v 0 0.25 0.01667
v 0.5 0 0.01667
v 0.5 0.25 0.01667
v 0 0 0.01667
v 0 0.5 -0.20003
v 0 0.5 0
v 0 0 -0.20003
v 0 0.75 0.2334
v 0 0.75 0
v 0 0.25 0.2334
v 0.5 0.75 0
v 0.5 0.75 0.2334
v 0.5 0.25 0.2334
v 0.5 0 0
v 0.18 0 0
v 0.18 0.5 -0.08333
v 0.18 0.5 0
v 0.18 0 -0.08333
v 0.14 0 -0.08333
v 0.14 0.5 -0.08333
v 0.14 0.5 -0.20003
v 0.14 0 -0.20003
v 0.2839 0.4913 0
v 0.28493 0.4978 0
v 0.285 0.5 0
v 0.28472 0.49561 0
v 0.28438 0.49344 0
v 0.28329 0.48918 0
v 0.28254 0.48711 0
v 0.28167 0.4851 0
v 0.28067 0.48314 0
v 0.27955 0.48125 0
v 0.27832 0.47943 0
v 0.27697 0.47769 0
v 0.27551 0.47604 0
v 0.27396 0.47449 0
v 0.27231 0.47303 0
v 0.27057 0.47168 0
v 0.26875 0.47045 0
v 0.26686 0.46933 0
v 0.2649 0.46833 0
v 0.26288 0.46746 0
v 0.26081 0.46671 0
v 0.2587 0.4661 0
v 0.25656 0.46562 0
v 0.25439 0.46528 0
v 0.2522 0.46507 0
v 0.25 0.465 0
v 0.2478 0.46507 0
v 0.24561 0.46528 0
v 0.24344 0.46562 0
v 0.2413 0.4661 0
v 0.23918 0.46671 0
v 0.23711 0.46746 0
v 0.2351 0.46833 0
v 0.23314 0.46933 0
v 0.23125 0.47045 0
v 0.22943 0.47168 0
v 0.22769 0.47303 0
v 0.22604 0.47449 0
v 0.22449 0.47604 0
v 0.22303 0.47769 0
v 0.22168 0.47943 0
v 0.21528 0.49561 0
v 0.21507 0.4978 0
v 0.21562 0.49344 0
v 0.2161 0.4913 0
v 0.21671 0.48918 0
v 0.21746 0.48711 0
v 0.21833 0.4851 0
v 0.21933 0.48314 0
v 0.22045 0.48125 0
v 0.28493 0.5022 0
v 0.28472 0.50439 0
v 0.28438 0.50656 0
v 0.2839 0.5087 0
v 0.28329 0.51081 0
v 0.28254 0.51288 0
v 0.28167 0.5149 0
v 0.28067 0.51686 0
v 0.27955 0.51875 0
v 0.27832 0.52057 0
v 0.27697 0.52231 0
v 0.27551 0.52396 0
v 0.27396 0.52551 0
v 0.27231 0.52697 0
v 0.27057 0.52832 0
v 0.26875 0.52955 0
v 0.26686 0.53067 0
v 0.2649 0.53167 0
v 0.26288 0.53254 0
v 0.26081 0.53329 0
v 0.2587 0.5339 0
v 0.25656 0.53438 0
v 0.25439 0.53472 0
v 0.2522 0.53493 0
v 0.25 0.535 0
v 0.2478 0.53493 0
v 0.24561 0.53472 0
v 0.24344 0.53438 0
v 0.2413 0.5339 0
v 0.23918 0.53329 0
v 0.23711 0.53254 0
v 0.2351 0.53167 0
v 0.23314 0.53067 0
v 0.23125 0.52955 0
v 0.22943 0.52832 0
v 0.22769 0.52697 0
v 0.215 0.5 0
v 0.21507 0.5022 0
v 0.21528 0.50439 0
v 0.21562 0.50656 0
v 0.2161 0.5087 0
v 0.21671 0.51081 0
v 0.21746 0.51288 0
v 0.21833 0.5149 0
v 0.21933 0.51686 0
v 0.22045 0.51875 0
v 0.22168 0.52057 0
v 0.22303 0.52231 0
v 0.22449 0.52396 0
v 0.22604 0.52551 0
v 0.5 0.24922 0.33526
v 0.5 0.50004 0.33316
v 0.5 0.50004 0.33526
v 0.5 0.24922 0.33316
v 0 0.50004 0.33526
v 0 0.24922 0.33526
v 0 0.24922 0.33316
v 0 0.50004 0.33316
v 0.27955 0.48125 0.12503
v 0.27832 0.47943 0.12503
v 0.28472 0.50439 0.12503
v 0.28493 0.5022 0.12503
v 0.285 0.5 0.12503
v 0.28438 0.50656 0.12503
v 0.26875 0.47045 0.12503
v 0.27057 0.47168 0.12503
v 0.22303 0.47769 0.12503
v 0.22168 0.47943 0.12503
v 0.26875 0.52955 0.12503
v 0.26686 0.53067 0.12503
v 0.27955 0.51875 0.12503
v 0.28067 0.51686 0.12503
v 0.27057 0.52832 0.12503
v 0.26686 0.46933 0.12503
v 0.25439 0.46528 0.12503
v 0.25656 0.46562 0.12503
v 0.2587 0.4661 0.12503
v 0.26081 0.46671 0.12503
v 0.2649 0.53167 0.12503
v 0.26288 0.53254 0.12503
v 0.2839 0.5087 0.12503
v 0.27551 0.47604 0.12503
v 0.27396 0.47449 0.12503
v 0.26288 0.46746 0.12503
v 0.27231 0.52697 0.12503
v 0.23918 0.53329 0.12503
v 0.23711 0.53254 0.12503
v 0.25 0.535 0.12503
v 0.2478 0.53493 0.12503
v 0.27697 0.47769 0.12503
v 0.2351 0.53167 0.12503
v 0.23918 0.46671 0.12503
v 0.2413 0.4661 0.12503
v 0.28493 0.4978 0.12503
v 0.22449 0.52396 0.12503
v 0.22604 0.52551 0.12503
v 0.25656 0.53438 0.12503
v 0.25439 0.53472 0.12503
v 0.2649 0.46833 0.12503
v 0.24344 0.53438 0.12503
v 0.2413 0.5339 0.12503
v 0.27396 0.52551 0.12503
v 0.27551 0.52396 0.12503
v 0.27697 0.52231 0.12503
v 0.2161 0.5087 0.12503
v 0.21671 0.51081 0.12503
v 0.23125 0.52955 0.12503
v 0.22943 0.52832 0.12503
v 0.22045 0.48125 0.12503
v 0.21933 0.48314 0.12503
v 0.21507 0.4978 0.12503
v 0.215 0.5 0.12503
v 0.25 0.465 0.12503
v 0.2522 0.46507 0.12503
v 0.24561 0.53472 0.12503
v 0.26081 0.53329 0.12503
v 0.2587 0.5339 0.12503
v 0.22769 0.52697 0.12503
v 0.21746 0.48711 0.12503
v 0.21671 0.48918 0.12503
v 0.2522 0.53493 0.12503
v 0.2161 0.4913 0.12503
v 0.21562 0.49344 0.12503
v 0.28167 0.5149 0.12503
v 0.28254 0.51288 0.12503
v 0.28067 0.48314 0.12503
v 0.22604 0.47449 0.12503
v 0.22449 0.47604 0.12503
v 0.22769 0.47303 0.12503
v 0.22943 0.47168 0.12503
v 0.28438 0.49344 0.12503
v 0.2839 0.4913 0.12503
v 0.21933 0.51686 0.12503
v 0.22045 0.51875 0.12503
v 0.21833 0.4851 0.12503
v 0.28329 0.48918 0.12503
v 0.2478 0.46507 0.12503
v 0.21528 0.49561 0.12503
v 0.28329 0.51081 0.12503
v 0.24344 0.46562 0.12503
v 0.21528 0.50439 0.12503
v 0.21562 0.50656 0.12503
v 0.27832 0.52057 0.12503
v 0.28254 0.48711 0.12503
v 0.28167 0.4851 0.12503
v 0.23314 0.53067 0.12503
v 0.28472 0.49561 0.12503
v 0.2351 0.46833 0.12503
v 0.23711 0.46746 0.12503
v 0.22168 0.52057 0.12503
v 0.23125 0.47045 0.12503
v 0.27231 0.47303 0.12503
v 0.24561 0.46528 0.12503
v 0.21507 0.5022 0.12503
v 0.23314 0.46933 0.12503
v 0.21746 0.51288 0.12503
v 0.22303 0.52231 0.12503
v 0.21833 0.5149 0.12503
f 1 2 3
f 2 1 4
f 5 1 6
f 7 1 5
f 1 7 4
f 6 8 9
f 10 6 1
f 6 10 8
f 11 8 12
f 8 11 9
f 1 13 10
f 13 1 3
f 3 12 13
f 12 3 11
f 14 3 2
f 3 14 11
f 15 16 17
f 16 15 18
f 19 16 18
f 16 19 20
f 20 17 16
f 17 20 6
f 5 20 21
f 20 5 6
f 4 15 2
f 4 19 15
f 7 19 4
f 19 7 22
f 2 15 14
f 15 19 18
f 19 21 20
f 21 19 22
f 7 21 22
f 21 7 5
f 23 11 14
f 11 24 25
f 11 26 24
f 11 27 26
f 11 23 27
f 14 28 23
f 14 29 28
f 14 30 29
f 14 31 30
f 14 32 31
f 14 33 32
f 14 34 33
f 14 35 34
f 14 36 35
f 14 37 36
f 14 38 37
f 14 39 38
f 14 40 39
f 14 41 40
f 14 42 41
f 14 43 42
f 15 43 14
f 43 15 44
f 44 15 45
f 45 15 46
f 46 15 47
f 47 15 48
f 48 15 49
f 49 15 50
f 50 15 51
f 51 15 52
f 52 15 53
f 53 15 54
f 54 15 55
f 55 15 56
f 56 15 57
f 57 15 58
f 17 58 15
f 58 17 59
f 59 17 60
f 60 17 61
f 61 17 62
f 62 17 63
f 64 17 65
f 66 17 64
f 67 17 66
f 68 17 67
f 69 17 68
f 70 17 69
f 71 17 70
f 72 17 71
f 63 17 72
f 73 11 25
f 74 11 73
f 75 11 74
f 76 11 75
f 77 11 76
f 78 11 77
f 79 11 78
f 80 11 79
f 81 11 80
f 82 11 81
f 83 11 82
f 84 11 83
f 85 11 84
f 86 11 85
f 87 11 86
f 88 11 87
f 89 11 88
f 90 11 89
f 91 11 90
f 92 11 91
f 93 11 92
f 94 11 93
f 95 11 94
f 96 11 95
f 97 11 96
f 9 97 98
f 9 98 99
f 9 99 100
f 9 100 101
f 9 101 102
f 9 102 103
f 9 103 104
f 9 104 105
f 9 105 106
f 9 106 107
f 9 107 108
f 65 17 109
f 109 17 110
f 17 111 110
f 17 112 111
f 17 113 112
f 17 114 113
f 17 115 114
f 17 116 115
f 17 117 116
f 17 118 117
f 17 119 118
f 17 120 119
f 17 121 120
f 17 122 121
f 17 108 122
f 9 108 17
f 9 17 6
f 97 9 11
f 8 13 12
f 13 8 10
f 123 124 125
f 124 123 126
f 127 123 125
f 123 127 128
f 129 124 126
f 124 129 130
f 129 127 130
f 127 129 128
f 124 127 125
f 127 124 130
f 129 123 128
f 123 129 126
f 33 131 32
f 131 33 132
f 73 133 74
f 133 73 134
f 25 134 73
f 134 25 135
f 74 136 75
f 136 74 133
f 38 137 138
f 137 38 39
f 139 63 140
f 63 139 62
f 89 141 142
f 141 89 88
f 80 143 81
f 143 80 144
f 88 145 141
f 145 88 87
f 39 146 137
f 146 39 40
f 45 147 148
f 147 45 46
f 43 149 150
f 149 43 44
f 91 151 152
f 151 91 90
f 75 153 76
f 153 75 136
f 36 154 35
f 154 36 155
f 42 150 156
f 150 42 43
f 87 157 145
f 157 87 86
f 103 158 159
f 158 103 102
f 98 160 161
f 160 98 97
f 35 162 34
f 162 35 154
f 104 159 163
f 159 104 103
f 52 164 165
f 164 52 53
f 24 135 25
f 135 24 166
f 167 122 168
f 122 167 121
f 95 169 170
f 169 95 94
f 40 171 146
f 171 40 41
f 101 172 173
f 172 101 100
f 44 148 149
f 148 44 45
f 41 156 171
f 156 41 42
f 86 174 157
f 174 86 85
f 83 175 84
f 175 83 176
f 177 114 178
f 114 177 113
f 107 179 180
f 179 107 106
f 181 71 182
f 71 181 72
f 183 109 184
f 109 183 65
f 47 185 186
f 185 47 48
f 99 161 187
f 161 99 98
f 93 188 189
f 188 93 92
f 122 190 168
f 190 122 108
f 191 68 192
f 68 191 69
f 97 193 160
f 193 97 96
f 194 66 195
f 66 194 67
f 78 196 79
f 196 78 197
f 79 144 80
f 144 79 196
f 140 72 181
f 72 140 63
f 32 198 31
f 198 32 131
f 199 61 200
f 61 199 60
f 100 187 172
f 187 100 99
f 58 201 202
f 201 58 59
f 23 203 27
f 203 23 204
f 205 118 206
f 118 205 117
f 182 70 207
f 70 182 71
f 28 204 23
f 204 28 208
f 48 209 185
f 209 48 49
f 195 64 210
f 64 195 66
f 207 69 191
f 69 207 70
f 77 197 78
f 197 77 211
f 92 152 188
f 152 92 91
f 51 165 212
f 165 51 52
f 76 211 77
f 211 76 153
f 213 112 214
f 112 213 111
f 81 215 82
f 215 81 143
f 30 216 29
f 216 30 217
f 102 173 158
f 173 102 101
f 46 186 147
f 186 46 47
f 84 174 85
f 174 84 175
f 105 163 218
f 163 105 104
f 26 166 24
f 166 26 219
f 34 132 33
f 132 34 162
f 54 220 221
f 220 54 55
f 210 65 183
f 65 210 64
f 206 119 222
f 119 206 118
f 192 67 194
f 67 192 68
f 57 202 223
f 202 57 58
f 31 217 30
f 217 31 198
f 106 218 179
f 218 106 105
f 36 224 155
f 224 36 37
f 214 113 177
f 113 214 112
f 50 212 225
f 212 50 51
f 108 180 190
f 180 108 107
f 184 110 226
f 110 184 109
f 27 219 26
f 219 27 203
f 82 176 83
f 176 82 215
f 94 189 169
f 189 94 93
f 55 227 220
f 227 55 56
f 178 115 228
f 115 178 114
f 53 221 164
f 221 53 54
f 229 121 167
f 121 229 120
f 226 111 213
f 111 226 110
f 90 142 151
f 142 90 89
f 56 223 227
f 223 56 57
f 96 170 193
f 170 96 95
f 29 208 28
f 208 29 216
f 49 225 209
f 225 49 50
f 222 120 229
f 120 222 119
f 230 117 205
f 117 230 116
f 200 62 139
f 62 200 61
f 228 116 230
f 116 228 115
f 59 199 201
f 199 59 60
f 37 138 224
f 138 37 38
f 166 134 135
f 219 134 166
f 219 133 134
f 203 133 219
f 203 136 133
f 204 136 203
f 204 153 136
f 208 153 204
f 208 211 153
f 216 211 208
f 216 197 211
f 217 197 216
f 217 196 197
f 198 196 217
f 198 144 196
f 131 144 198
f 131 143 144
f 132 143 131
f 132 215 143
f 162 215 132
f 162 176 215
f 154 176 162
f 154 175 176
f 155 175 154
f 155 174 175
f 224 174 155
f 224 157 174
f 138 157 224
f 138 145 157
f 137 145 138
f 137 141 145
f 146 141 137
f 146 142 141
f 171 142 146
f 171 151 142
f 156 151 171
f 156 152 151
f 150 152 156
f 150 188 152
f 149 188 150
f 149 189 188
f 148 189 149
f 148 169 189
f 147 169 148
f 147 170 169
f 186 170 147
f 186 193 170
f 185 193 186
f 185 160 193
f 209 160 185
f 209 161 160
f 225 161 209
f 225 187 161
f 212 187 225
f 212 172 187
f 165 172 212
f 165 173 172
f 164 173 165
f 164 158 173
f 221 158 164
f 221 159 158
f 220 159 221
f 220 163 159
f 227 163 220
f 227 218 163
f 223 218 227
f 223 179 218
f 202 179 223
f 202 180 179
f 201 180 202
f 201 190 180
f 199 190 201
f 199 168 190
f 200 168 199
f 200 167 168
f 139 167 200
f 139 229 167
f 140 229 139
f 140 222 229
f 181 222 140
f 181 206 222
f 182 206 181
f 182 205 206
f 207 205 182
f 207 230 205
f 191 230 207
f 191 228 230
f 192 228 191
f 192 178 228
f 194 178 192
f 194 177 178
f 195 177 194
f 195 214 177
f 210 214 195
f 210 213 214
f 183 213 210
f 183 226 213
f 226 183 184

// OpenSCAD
$fn = 100;

// === Parametric Variables ===
// Base Slab
base_len = 0.5;
base_wid = 0.75;
base_ht = 0.016667;

// Upper Rectangular Pad
pad_len = 0.5;
pad_wid = 0.5;
pad_reach_z = 0.2334;
pad_y_offset = 0.25;

// Narrow Edge Strips
strip_len = 0.0083;
strip_wid = 0.5;
strip_ht = 0.0083;

// Transverse Feature
trans_len = 0.5;
trans_wid = 0.250819;
trans_ht = 0.0021;
trans_reach_z = 0.335265;
trans_y_offset = 0.24922;

// Stepped Portion
step_upper_ht = 0.1;
step_lower_ht = 0.2167;
step_shallow_len = 0.18;
step_deep_len = 0.14;
step_wid = 0.5;

// Internal Void
void_radius = 0.035;

// === Module Definitions ===

// Base reference slab
module base_slab() {
    cube([base_len, base_wid, base_ht]);
}

// Upper-side rectangular pad (sits on base)
module upper_pad() {
    h = pad_reach_z - base_ht;
    translate([0, pad_y_offset, base_ht]) {
        cube([pad_len, pad_wid, h]);
    }
}

// Narrow edge strips over rear region
module edge_strips() {
    translate([0, pad_y_offset, base_ht]) {
        cube([strip_len, strip_wid, strip_ht]);
    }
    translate([base_len - strip_len, pad_y_offset, base_ht]) {
        cube([strip_len, strip_wid, strip_ht]);
    }
}

// Thin transverse feature (positioned at specified reach)
module transverse_feature() {
    z_pos = trans_reach_z - trans_ht;
    translate([0, trans_y_offset, z_pos]) {
        cube([trans_len, trans_wid, trans_ht]);
    }
}

// Aligned stepped portion (shares shoulder, left, front, back edges)
module stepped_portion() {
    // Shared shoulder aligned with base top
    shoulder_z = base_ht;
    // Shallow upper pad
    translate([0, 0, shoulder_z - step_upper_ht]) {
        cube([step_shallow_len, step_wid, step_upper_ht]);
    }
    // Deeper continuation below, contained within shallow footprint
    translate([0, 0, shoulder_z - step_lower_ht]) {
        cube([step_deep_len, step_wid, step_lower_ht]);
    }
}

// Internal void cutting through the upper pad
module internal_void() {
    h_cut = pad_reach_z - base_ht + 0.02;
    translate([pad_len/2, pad_y_offset + pad_wid/2, base_ht - 0.01]) {
        cylinder(h=h_cut, r=void_radius, center=true);
    }
}

// === Main Assembly ===
difference() {
    union() {
        base_slab();
        upper_pad();
        edge_strips();
        transverse_feature();
        // Place stepped portion aligned to front-left region
        translate([0, 0, 0]) stepped_portion();
    }
    internal_void();
}
